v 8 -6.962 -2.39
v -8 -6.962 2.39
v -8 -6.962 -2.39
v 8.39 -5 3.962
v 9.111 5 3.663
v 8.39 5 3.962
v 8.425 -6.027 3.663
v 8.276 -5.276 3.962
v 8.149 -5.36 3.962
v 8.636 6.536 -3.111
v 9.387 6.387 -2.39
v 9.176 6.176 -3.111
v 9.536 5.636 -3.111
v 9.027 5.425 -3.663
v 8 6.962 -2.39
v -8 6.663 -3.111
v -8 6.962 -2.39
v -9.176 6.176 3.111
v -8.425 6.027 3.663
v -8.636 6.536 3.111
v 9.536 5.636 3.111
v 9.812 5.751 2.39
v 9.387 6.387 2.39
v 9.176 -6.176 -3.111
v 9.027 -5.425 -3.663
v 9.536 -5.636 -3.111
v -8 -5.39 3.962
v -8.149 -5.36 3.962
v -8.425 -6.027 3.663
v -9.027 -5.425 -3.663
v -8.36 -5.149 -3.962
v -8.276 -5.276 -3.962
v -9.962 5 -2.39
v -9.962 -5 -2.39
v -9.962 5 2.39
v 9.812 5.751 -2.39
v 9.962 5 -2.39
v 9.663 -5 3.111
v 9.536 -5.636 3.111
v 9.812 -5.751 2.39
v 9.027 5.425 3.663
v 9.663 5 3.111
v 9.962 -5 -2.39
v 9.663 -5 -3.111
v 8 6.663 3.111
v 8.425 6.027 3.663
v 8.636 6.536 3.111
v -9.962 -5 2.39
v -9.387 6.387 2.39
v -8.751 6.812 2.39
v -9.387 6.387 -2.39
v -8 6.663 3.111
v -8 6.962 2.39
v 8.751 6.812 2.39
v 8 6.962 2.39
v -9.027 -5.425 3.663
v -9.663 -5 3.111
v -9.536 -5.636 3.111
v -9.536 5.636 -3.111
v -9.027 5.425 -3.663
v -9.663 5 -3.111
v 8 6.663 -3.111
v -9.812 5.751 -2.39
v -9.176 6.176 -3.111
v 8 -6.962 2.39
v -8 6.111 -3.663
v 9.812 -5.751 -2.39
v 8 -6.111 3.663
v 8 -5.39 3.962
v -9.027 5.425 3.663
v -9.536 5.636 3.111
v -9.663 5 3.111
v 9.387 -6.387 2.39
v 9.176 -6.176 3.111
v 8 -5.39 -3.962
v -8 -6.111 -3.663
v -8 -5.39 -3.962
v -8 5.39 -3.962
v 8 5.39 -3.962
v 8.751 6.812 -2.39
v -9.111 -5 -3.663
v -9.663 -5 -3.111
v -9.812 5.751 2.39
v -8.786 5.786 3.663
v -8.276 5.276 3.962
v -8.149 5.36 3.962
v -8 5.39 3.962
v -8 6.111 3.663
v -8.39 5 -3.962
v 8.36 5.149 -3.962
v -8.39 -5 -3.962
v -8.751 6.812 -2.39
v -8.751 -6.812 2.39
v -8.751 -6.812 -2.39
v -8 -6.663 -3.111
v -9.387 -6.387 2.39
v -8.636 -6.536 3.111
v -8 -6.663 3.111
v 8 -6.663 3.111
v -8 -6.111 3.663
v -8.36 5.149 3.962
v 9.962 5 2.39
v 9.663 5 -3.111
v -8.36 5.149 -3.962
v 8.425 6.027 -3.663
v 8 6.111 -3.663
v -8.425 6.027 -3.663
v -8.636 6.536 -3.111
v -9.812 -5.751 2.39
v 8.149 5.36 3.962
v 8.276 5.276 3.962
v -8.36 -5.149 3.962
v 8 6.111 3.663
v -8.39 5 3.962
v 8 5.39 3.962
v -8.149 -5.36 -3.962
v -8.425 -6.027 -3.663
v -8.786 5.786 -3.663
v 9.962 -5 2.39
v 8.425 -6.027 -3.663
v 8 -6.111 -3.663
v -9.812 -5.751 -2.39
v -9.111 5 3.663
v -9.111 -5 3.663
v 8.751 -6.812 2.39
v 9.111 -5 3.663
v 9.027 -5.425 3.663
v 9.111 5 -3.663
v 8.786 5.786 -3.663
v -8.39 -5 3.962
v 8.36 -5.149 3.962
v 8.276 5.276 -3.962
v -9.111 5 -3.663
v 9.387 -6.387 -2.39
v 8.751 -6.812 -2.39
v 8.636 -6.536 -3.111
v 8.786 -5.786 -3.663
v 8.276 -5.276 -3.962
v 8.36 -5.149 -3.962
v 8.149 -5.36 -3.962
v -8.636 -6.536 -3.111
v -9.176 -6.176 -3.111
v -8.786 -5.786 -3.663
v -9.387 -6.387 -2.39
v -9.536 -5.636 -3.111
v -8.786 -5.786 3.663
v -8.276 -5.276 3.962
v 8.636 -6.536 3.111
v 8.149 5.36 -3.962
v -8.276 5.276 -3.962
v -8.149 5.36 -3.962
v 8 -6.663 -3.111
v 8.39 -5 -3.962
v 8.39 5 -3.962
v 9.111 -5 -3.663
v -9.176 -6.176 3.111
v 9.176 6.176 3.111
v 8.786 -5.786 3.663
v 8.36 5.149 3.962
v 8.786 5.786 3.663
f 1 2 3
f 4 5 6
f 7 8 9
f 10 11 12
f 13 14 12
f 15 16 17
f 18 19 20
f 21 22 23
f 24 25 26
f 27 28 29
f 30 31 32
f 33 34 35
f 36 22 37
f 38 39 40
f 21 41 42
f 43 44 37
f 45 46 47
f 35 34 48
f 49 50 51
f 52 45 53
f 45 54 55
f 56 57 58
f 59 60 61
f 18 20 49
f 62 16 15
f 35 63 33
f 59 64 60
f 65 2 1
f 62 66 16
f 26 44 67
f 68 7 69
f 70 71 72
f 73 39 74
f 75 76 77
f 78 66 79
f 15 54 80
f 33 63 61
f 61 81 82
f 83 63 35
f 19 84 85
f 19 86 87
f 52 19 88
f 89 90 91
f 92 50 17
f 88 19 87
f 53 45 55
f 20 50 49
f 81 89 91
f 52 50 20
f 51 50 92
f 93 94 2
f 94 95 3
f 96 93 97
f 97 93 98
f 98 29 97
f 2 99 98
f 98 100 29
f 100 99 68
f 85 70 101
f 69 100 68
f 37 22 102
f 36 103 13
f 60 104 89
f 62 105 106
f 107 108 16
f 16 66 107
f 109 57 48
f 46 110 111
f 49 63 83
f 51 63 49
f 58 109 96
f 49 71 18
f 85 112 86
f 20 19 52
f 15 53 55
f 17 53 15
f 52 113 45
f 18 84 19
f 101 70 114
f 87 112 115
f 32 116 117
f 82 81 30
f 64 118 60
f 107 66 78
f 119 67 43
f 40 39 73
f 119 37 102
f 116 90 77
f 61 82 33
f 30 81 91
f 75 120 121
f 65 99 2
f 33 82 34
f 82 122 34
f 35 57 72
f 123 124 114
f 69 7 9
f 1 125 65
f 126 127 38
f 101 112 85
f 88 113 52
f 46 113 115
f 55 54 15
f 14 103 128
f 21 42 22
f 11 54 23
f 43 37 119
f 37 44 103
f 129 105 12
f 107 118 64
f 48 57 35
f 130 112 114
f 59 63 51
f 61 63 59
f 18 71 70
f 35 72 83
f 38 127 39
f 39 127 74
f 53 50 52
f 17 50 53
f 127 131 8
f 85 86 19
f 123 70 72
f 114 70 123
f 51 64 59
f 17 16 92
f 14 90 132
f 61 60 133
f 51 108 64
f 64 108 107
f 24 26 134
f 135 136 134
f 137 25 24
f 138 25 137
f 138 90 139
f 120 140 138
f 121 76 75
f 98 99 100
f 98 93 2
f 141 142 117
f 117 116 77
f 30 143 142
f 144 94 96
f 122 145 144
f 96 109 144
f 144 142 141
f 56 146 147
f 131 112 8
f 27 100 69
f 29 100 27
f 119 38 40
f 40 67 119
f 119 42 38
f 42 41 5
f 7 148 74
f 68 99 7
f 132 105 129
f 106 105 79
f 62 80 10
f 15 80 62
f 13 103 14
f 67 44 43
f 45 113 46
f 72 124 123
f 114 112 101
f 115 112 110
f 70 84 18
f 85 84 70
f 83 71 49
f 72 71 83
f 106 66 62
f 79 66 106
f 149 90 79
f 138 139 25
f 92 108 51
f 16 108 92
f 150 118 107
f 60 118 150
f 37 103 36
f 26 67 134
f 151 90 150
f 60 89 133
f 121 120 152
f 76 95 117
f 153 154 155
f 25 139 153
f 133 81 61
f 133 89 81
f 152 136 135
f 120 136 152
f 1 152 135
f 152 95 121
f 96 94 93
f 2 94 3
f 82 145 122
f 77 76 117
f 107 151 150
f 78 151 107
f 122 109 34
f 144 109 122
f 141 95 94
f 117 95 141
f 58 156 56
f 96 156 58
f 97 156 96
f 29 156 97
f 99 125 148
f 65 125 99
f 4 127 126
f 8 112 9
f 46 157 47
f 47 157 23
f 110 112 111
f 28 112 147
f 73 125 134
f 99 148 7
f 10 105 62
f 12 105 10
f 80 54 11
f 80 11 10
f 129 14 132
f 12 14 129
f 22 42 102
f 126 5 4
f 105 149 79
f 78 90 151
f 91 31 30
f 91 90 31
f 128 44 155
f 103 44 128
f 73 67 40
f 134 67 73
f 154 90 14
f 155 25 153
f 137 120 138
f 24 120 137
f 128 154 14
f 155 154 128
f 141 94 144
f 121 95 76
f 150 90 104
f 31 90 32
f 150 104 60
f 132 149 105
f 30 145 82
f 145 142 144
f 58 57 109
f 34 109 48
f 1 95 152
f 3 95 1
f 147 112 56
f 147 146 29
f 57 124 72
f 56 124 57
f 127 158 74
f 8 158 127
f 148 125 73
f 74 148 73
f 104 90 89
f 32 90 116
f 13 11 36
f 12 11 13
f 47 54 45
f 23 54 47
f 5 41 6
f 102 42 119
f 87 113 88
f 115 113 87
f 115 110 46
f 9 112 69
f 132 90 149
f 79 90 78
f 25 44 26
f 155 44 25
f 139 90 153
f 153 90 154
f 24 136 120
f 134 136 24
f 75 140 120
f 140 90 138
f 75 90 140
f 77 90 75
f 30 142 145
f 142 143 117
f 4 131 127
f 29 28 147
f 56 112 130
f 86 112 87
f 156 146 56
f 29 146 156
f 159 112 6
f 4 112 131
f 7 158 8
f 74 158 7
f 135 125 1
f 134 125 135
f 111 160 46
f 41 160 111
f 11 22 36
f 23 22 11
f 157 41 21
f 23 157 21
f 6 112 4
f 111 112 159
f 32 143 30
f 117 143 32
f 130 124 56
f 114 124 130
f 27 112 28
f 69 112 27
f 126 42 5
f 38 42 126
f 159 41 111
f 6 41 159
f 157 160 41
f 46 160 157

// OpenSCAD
// 3D minkowski rounding a (convex) box with a sphere — exact for convex operands.
minkowski() { cube([16, 10, 4], center = true); sphere(2, $fn = 16); }
